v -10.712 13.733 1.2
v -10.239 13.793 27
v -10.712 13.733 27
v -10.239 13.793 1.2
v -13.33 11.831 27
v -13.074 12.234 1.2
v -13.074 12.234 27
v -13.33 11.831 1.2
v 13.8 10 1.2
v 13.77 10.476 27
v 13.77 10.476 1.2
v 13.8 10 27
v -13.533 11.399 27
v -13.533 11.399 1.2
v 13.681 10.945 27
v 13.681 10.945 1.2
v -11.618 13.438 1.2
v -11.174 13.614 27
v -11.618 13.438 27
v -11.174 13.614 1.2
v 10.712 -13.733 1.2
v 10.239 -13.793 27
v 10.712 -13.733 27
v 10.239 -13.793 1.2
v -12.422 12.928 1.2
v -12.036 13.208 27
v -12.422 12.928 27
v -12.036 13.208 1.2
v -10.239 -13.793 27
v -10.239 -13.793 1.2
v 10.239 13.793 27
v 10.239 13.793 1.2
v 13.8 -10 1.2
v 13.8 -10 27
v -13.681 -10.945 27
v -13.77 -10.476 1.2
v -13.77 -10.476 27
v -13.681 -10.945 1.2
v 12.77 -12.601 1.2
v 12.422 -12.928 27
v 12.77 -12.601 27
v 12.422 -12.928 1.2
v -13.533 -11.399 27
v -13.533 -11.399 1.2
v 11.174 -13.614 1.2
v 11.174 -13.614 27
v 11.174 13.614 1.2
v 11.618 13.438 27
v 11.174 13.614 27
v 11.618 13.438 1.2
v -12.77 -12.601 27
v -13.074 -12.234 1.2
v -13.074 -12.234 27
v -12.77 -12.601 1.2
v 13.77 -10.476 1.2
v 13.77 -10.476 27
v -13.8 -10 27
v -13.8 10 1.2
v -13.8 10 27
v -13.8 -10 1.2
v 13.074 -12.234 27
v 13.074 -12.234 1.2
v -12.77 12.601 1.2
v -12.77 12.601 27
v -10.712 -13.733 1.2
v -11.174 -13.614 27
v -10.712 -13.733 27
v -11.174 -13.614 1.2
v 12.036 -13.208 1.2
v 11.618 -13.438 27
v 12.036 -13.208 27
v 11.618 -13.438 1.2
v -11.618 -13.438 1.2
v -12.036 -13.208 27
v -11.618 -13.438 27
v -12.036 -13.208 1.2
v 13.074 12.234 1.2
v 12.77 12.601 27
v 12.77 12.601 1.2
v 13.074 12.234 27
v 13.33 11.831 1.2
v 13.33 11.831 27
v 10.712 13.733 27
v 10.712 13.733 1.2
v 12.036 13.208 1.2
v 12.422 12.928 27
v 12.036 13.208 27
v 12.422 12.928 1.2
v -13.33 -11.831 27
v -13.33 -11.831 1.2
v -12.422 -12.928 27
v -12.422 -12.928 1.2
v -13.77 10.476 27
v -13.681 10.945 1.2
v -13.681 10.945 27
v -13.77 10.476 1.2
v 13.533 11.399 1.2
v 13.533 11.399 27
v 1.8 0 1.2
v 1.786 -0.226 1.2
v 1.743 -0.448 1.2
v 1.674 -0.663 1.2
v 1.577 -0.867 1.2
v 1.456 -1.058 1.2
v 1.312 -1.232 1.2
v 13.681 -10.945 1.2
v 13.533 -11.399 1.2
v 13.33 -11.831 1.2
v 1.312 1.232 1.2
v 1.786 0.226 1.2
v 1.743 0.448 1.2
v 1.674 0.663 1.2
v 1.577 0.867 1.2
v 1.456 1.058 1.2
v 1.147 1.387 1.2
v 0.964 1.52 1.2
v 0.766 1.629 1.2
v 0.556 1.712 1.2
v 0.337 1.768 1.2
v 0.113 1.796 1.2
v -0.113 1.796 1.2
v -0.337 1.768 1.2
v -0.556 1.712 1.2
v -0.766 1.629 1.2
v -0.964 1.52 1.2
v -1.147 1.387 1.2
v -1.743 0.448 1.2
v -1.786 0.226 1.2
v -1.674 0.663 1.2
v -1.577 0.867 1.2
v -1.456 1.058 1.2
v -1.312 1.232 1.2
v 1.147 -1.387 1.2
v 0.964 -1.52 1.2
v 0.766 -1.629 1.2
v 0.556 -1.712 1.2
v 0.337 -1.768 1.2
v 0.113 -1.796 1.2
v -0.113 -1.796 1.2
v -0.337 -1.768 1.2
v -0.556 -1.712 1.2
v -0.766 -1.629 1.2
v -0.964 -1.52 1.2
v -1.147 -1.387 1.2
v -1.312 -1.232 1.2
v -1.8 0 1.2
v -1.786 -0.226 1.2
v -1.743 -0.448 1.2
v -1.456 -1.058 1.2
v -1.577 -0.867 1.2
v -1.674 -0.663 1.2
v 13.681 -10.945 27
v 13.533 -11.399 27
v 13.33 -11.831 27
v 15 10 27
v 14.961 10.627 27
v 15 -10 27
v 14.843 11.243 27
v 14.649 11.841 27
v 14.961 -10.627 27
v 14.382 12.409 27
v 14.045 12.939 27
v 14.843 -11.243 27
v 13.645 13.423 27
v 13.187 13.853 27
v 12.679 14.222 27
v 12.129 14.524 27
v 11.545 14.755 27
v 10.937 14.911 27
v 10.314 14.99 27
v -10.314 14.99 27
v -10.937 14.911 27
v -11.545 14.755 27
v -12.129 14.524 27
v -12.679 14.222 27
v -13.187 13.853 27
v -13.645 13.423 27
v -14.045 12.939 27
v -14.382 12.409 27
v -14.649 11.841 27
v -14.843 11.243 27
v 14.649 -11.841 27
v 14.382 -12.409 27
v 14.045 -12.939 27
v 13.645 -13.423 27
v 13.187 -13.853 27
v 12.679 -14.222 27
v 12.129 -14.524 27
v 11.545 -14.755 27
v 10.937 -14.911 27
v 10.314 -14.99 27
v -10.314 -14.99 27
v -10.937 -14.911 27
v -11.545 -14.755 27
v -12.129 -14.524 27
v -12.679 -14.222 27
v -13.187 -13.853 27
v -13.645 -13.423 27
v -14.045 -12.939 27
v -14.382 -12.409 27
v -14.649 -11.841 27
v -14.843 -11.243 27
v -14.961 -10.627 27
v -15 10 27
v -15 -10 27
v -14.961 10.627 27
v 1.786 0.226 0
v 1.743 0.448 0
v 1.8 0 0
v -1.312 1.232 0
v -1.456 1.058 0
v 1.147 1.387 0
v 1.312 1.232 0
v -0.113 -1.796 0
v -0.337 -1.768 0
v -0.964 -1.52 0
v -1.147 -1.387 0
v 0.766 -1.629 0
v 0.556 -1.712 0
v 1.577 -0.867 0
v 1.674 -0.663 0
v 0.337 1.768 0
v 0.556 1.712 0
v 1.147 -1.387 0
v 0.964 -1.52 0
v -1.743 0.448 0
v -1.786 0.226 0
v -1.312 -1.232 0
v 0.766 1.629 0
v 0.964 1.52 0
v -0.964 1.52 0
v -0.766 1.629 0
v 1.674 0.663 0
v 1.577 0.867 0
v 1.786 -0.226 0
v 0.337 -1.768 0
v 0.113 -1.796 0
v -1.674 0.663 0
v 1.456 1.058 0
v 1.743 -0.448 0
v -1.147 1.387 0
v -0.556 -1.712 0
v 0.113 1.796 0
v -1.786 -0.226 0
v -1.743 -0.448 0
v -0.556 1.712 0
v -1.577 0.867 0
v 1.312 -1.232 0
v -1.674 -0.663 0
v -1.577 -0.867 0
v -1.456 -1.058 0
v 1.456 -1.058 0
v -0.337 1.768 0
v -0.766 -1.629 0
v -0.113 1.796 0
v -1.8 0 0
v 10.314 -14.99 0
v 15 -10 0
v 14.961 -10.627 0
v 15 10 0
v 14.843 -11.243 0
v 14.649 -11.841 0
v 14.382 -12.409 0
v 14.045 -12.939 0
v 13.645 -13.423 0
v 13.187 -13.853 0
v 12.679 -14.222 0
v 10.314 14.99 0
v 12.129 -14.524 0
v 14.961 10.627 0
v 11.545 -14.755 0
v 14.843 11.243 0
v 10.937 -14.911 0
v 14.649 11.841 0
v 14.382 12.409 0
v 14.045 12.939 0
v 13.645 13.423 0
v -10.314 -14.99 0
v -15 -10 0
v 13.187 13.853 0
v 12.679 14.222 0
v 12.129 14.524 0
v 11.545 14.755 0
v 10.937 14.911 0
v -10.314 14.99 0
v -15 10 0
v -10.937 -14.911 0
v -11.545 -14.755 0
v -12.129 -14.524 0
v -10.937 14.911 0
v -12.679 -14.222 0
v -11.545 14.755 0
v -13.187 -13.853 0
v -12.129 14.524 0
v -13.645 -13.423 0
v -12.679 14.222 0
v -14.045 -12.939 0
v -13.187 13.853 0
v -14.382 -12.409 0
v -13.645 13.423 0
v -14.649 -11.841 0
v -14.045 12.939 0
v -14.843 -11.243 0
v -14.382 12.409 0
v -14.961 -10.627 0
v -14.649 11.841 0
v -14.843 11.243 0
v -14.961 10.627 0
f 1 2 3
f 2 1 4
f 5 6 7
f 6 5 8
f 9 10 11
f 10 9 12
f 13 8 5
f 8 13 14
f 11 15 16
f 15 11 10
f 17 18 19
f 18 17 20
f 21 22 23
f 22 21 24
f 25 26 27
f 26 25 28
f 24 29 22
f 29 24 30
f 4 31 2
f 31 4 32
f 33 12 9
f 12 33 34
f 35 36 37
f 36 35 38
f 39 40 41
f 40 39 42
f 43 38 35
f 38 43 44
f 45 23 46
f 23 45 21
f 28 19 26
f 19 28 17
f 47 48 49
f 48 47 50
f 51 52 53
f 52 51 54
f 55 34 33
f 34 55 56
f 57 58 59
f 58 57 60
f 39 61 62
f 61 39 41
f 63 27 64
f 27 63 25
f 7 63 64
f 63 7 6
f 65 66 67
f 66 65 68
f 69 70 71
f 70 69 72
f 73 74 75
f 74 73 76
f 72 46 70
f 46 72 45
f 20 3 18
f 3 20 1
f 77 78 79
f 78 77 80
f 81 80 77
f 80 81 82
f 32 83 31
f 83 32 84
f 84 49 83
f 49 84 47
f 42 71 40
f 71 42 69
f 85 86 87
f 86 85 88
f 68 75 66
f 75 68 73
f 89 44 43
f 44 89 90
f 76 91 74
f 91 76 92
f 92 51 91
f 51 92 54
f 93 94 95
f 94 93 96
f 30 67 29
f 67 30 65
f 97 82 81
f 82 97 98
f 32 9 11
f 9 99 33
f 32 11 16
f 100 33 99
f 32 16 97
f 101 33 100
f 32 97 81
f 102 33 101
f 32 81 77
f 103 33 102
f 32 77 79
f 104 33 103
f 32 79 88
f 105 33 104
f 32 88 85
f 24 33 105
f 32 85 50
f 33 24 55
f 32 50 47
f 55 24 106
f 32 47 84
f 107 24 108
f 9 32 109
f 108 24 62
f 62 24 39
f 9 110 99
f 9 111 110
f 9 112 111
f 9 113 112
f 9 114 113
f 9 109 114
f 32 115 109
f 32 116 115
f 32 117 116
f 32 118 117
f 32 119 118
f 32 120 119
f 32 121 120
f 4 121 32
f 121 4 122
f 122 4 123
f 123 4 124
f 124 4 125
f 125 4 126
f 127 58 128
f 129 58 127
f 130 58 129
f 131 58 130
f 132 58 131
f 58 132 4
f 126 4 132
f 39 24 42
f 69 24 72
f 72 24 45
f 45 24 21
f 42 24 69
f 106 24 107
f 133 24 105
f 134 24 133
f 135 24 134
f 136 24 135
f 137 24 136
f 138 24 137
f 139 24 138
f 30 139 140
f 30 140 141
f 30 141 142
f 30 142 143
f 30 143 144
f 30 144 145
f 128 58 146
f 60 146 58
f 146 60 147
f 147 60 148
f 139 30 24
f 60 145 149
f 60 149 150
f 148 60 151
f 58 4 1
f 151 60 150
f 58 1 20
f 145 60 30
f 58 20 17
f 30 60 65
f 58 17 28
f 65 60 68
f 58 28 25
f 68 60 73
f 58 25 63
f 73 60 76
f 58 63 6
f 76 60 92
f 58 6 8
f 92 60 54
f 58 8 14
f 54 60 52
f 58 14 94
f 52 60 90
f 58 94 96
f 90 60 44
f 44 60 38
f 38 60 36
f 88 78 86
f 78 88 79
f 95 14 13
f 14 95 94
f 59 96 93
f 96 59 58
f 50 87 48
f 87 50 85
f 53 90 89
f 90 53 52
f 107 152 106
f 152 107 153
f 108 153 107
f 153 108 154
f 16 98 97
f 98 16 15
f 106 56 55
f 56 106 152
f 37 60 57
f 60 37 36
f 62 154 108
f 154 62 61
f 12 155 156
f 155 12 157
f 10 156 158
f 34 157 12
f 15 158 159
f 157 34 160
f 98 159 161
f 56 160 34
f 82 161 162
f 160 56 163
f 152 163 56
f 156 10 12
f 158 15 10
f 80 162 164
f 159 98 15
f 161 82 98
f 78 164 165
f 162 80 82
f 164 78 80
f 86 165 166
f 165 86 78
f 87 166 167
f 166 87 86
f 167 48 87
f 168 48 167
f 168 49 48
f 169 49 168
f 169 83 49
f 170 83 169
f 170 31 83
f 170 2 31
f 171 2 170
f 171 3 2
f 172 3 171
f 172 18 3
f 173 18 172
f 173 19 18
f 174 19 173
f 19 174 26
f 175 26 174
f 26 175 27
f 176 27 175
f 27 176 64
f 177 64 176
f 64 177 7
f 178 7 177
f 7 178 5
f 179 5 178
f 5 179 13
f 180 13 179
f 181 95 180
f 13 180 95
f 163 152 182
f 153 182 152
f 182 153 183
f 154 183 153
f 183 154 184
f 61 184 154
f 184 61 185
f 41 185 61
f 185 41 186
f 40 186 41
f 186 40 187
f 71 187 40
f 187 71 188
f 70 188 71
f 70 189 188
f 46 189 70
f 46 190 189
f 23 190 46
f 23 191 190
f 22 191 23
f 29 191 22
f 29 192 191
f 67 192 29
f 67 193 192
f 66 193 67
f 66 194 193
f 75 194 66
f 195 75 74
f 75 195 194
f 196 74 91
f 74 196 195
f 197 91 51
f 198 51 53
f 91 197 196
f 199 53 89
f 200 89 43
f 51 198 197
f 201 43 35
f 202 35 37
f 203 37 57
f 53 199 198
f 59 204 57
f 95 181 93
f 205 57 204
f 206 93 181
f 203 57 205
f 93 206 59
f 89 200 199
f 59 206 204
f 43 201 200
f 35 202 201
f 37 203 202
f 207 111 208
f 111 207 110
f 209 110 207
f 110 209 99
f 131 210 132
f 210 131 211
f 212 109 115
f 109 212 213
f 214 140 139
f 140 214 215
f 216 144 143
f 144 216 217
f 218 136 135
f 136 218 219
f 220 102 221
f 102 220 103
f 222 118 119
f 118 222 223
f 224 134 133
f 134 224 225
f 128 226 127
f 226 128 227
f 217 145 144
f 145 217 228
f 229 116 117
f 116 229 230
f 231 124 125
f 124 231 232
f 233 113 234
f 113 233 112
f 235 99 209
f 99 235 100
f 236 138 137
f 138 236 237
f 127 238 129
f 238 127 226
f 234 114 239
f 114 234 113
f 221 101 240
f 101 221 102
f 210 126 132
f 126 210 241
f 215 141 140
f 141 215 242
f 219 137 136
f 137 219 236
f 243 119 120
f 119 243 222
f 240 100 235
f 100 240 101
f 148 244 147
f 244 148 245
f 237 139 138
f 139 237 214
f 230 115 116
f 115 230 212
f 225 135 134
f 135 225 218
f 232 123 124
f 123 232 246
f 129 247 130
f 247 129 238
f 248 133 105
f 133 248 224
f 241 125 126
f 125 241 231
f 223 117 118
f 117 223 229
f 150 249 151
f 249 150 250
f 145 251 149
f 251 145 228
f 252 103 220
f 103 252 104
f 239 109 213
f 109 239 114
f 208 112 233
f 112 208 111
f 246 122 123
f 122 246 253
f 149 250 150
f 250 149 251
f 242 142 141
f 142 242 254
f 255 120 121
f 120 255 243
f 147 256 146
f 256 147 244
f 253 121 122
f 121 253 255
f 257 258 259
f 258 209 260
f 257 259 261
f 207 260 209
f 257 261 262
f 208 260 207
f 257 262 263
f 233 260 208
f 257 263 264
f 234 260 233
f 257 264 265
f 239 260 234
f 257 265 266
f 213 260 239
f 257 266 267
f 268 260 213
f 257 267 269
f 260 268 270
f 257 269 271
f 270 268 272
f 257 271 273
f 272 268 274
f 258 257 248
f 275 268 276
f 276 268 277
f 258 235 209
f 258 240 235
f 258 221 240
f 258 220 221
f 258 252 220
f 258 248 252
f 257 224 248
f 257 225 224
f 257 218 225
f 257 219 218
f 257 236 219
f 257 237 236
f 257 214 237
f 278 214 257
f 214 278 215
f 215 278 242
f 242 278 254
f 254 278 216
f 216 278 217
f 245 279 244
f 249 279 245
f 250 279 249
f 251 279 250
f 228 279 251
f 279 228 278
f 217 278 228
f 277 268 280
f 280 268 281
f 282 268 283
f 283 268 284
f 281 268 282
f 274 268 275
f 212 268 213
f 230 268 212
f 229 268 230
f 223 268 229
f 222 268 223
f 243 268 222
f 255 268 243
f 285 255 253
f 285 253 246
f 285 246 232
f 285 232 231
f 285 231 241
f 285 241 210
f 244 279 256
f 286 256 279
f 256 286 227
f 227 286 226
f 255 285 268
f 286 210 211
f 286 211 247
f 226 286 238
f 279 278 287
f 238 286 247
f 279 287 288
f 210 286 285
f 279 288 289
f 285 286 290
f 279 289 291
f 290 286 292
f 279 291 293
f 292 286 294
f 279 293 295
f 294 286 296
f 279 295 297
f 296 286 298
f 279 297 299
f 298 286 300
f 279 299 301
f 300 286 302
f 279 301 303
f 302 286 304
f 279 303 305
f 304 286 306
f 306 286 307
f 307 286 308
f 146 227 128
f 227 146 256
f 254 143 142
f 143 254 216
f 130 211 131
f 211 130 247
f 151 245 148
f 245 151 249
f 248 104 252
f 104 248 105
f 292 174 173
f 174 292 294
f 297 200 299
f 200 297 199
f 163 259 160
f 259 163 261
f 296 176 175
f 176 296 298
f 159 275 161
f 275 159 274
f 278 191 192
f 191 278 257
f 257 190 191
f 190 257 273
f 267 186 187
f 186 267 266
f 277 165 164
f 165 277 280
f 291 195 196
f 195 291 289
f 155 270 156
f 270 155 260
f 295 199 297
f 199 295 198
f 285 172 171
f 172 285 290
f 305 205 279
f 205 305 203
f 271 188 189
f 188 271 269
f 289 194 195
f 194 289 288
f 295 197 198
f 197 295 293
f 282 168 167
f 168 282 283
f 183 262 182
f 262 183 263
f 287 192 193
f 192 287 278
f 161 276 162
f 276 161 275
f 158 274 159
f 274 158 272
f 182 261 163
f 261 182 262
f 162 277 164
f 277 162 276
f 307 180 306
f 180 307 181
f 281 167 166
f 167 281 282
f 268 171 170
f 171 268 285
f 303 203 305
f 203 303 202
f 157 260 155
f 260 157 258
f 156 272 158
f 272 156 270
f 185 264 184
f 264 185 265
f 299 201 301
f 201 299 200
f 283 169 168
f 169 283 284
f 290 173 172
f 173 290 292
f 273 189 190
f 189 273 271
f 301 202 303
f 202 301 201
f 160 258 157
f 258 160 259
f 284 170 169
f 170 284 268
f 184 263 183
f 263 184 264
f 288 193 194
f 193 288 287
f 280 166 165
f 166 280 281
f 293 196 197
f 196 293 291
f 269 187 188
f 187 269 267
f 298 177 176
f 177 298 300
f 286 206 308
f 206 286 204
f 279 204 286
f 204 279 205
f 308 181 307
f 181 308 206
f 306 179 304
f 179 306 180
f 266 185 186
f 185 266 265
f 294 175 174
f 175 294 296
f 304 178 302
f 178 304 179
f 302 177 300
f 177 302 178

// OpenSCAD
$fn = 50;


difference() {
	union() {
		hull() {
			translate(v = [-10.0000000000, 10.0000000000, 0]) {
				cylinder(h = 27, r = 5);
			}
			translate(v = [10.0000000000, 10.0000000000, 0]) {
				cylinder(h = 27, r = 5);
			}
			translate(v = [-10.0000000000, -10.0000000000, 0]) {
				cylinder(h = 27, r = 5);
			}
			translate(v = [10.0000000000, -10.0000000000, 0]) {
				cylinder(h = 27, r = 5);
			}
		}
	}
	union() {
		translate(v = [0, 0, 1.2000000000]) {
			hull() {
				translate(v = [-10.0000000000, 10.0000000000, 0]) {
					cylinder(h = 25.8000000000, r = 3.8000000000);
				}
				translate(v = [10.0000000000, 10.0000000000, 0]) {
					cylinder(h = 25.8000000000, r = 3.8000000000);
				}
				translate(v = [-10.0000000000, -10.0000000000, 0]) {
					cylinder(h = 25.8000000000, r = 3.8000000000);
				}
				translate(v = [10.0000000000, -10.0000000000, 0]) {
					cylinder(h = 25.8000000000, r = 3.8000000000);
				}
			}
		}
		#cylinder(h = 1.2000000000, r = 1.8000000000);
	}
}
